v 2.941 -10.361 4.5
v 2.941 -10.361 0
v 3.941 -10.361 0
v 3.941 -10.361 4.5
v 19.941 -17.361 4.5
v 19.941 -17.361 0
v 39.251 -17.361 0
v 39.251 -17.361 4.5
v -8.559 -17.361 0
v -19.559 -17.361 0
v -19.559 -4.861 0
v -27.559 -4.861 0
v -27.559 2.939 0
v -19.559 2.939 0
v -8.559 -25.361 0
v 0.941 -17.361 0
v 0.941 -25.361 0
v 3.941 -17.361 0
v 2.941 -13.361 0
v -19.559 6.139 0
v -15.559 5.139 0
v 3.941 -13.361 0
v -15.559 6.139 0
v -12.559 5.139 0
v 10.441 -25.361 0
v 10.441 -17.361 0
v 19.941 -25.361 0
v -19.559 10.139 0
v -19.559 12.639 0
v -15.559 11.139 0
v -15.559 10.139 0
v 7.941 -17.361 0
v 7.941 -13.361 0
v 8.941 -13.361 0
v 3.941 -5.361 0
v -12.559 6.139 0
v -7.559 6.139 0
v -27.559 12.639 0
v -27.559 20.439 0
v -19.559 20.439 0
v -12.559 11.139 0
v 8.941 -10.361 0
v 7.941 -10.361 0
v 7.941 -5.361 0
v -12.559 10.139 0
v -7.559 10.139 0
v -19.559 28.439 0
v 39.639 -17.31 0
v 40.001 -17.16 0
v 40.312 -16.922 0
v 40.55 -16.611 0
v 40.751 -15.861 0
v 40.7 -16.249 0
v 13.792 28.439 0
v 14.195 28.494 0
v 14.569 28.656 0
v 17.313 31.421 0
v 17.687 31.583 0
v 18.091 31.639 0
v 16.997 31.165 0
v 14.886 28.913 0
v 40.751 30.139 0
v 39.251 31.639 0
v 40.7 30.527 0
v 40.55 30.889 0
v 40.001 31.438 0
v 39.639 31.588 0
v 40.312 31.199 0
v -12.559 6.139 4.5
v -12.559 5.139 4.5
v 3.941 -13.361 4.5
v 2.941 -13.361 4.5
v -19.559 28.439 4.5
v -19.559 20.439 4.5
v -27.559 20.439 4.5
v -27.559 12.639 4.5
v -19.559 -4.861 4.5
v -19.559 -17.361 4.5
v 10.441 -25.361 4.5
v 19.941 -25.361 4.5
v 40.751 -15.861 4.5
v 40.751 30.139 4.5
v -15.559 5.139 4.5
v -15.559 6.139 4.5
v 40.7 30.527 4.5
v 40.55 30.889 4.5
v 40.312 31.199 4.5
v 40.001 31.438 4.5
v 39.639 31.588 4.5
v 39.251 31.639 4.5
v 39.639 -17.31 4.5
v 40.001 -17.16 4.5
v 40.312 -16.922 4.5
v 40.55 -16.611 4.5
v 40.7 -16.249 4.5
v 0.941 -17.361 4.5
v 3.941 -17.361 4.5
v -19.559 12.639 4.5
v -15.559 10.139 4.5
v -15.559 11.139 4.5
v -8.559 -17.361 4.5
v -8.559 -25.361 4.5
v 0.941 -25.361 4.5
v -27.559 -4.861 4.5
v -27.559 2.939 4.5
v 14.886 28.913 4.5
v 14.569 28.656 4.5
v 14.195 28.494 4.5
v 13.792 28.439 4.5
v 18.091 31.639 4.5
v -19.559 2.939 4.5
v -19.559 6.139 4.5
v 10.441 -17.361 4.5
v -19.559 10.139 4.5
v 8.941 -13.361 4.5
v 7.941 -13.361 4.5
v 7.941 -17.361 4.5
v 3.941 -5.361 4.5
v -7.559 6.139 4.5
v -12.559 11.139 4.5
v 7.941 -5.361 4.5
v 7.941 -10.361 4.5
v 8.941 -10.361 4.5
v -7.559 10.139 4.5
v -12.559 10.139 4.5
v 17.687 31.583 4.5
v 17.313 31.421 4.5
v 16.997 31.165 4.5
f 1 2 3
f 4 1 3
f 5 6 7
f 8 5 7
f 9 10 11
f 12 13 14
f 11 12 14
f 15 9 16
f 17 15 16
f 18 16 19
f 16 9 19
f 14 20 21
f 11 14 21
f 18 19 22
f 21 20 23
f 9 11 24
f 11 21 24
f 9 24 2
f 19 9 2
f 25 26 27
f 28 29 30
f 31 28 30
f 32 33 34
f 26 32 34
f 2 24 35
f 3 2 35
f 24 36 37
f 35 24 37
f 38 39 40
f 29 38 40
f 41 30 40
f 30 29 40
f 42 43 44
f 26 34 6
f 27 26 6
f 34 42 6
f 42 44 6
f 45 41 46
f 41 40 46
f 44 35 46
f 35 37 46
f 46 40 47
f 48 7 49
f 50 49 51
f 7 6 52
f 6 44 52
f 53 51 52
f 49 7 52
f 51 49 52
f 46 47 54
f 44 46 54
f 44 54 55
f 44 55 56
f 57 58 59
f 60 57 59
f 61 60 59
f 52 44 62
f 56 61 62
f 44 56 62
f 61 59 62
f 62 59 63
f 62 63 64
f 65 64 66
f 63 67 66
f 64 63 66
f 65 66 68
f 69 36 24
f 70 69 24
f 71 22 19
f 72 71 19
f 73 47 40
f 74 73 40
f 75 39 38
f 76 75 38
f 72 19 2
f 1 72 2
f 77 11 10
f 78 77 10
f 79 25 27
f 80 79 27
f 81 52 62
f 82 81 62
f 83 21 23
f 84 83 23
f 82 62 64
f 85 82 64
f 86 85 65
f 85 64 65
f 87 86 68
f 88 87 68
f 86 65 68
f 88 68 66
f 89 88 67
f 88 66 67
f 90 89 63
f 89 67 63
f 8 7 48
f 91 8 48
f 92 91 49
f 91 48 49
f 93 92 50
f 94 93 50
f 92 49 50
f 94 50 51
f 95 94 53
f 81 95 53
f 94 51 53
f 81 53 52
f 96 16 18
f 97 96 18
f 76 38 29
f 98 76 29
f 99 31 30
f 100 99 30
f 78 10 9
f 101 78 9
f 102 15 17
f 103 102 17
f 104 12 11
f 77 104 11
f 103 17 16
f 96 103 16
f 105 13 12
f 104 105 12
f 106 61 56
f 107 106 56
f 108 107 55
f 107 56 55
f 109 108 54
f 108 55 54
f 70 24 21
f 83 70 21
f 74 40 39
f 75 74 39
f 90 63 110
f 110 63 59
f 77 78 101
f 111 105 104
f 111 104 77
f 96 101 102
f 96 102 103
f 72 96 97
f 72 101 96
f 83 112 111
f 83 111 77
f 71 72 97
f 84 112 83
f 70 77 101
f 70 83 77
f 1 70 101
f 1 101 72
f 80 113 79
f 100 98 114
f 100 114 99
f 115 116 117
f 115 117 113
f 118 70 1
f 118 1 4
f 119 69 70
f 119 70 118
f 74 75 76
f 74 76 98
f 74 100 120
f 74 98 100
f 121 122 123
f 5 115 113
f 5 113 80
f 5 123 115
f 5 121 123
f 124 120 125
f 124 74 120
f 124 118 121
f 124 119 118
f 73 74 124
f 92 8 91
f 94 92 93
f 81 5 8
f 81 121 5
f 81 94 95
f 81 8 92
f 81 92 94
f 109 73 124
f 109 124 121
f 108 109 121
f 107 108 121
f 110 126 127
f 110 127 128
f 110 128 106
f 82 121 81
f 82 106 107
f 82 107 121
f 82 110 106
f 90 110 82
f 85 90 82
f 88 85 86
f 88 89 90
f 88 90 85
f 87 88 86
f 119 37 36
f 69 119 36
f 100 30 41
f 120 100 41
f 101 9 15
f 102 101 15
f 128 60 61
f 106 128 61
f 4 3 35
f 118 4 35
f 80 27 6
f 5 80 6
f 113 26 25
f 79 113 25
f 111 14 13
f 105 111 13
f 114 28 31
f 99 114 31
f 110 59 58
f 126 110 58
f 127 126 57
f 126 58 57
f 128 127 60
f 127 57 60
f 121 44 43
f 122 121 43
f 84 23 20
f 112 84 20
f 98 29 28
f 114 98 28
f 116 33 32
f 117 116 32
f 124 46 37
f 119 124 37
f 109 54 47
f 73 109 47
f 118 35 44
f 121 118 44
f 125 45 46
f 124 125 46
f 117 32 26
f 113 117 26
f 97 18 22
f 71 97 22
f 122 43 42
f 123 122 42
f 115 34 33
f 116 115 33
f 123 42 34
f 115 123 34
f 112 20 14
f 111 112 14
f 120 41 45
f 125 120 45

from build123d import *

# Parameters (mm, degrees)
F1_DEPTH = 4.5


with BuildPart() as f1:
    # F0 (on Top) → F1 (new body)
    with BuildSketch(Plane.XY):
        with BuildLine():
            Line((13.791552, 28.438764), (-19.5586, 28.438764))
            Line((-19.5586, 28.438764), (-19.5586, 20.438764))
            Line((-19.5586, 20.438764), (-27.5586, 20.438764))
            Line((-27.5586, 20.438764), (-27.5586, 12.638764))
            Line((-27.5586, 12.638764), (-19.5586, 12.638764))
            Line((-19.5586, 12.638764), (-19.5586, 10.138764))
            Line((-19.5586, 10.138764), (-15.5586, 10.138764))
            Line((-15.5586, 10.138764), (-15.5586, 11.138764))
            Line((-15.5586, 11.138764), (-12.5586, 11.138764))
            Line((-12.5586, 11.138764), (-12.5586, 10.138764))
            Line((-12.5586, 10.138764), (-7.5586, 10.138764))
            Line((-7.5586, 10.138764), (-7.5586, 6.138764))
            Line((-7.5586, 6.138764), (-12.5586, 6.138764))
            Line((-12.5586, 6.138764), (-12.5586, 5.138764))
            Line((-12.5586, 5.138764), (-15.5586, 5.138764))
            Line((-15.5586, 5.138764), (-15.5586, 6.138764))
            Line((-15.5586, 6.138764), (-19.5586, 6.138764))
            Line((-19.5586, 6.138764), (-19.5586, 2.938764))
            Line((-19.5586, 2.938764), (-27.5586, 2.938764))
            Line((-27.5586, 2.938764), (-27.5586, -4.861236))
            Line((-27.5586, -4.861236), (-19.5586, -4.861236))
            Line((-19.5586, -4.861236), (-19.5586, -12.361236))
            Line((-19.5586, -12.361236), (-19.5586, -17.361236))
            Line((-19.5586, -17.361236), (-11.749149, -17.361236))
            Line((-11.749149, -17.361236), (-8.5586, -17.361236))
            Line((-8.5586, -17.361236), (-8.5586, -25.361236))
            Line((-8.5586, -25.361236), (0.9414, -25.361236))
            Line((0.9414, -25.361236), (0.9414, -17.361236))
            Line((0.9414, -17.361236), (3.9414, -17.361236))
            Line((3.9414, -17.361236), (3.9414, -13.361236))
            Line((3.9414, -13.361236), (2.9414, -13.361236))
            Line((2.9414, -13.361236), (2.9414, -10.361236))
            Line((2.9414, -10.361236), (3.9414, -10.361236))
            Line((3.9414, -10.361236), (3.9414, -5.361236))
            Line((3.9414, -5.361236), (7.9414, -5.361236))
            Line((7.9414, -5.361236), (7.9414, -10.361236))
            Line((7.9414, -10.361236), (8.9414, -10.361236))
            Line((8.9414, -10.361236), (8.9414, -13.361236))
            Line((8.9414, -13.361236), (7.9414, -13.361236))
            Line((7.9414, -13.361236), (7.9414, -17.361236))
            Line((7.9414, -17.361236), (10.4414, -17.361236))
            Line((10.4414, -17.361236), (10.4414, -25.361236))
            Line((10.4414, -25.361236), (19.9414, -25.361236))
            Line((19.9414, -25.361236), (19.9414, -17.361236))
            Line((19.9414, -17.361236), (39.250851, -17.361236))
            ThreePointArc((39.250851, -17.361236), (40.311511, -16.921896), (40.750851, -15.861236))
            Line((40.750851, -15.861236), (40.750851, 30.138764))
            ThreePointArc((40.750851, 30.138764), (40.311511, 31.199425), (39.250851, 31.638764))
            Line((39.250851, 31.638764), (18.091248, 31.638764))
            ThreePointArc((18.091248, 31.638764), (17.494954, 31.515149), (16.996942, 31.164676))
            Line((16.996942, 31.164676), (14.885857, 28.912853))
            ThreePointArc((14.885857, 28.912853), (14.387845, 28.56238), (13.791552, 28.438764))
        make_face()
    extrude(amount=F1_DEPTH)


solid = f1.part
